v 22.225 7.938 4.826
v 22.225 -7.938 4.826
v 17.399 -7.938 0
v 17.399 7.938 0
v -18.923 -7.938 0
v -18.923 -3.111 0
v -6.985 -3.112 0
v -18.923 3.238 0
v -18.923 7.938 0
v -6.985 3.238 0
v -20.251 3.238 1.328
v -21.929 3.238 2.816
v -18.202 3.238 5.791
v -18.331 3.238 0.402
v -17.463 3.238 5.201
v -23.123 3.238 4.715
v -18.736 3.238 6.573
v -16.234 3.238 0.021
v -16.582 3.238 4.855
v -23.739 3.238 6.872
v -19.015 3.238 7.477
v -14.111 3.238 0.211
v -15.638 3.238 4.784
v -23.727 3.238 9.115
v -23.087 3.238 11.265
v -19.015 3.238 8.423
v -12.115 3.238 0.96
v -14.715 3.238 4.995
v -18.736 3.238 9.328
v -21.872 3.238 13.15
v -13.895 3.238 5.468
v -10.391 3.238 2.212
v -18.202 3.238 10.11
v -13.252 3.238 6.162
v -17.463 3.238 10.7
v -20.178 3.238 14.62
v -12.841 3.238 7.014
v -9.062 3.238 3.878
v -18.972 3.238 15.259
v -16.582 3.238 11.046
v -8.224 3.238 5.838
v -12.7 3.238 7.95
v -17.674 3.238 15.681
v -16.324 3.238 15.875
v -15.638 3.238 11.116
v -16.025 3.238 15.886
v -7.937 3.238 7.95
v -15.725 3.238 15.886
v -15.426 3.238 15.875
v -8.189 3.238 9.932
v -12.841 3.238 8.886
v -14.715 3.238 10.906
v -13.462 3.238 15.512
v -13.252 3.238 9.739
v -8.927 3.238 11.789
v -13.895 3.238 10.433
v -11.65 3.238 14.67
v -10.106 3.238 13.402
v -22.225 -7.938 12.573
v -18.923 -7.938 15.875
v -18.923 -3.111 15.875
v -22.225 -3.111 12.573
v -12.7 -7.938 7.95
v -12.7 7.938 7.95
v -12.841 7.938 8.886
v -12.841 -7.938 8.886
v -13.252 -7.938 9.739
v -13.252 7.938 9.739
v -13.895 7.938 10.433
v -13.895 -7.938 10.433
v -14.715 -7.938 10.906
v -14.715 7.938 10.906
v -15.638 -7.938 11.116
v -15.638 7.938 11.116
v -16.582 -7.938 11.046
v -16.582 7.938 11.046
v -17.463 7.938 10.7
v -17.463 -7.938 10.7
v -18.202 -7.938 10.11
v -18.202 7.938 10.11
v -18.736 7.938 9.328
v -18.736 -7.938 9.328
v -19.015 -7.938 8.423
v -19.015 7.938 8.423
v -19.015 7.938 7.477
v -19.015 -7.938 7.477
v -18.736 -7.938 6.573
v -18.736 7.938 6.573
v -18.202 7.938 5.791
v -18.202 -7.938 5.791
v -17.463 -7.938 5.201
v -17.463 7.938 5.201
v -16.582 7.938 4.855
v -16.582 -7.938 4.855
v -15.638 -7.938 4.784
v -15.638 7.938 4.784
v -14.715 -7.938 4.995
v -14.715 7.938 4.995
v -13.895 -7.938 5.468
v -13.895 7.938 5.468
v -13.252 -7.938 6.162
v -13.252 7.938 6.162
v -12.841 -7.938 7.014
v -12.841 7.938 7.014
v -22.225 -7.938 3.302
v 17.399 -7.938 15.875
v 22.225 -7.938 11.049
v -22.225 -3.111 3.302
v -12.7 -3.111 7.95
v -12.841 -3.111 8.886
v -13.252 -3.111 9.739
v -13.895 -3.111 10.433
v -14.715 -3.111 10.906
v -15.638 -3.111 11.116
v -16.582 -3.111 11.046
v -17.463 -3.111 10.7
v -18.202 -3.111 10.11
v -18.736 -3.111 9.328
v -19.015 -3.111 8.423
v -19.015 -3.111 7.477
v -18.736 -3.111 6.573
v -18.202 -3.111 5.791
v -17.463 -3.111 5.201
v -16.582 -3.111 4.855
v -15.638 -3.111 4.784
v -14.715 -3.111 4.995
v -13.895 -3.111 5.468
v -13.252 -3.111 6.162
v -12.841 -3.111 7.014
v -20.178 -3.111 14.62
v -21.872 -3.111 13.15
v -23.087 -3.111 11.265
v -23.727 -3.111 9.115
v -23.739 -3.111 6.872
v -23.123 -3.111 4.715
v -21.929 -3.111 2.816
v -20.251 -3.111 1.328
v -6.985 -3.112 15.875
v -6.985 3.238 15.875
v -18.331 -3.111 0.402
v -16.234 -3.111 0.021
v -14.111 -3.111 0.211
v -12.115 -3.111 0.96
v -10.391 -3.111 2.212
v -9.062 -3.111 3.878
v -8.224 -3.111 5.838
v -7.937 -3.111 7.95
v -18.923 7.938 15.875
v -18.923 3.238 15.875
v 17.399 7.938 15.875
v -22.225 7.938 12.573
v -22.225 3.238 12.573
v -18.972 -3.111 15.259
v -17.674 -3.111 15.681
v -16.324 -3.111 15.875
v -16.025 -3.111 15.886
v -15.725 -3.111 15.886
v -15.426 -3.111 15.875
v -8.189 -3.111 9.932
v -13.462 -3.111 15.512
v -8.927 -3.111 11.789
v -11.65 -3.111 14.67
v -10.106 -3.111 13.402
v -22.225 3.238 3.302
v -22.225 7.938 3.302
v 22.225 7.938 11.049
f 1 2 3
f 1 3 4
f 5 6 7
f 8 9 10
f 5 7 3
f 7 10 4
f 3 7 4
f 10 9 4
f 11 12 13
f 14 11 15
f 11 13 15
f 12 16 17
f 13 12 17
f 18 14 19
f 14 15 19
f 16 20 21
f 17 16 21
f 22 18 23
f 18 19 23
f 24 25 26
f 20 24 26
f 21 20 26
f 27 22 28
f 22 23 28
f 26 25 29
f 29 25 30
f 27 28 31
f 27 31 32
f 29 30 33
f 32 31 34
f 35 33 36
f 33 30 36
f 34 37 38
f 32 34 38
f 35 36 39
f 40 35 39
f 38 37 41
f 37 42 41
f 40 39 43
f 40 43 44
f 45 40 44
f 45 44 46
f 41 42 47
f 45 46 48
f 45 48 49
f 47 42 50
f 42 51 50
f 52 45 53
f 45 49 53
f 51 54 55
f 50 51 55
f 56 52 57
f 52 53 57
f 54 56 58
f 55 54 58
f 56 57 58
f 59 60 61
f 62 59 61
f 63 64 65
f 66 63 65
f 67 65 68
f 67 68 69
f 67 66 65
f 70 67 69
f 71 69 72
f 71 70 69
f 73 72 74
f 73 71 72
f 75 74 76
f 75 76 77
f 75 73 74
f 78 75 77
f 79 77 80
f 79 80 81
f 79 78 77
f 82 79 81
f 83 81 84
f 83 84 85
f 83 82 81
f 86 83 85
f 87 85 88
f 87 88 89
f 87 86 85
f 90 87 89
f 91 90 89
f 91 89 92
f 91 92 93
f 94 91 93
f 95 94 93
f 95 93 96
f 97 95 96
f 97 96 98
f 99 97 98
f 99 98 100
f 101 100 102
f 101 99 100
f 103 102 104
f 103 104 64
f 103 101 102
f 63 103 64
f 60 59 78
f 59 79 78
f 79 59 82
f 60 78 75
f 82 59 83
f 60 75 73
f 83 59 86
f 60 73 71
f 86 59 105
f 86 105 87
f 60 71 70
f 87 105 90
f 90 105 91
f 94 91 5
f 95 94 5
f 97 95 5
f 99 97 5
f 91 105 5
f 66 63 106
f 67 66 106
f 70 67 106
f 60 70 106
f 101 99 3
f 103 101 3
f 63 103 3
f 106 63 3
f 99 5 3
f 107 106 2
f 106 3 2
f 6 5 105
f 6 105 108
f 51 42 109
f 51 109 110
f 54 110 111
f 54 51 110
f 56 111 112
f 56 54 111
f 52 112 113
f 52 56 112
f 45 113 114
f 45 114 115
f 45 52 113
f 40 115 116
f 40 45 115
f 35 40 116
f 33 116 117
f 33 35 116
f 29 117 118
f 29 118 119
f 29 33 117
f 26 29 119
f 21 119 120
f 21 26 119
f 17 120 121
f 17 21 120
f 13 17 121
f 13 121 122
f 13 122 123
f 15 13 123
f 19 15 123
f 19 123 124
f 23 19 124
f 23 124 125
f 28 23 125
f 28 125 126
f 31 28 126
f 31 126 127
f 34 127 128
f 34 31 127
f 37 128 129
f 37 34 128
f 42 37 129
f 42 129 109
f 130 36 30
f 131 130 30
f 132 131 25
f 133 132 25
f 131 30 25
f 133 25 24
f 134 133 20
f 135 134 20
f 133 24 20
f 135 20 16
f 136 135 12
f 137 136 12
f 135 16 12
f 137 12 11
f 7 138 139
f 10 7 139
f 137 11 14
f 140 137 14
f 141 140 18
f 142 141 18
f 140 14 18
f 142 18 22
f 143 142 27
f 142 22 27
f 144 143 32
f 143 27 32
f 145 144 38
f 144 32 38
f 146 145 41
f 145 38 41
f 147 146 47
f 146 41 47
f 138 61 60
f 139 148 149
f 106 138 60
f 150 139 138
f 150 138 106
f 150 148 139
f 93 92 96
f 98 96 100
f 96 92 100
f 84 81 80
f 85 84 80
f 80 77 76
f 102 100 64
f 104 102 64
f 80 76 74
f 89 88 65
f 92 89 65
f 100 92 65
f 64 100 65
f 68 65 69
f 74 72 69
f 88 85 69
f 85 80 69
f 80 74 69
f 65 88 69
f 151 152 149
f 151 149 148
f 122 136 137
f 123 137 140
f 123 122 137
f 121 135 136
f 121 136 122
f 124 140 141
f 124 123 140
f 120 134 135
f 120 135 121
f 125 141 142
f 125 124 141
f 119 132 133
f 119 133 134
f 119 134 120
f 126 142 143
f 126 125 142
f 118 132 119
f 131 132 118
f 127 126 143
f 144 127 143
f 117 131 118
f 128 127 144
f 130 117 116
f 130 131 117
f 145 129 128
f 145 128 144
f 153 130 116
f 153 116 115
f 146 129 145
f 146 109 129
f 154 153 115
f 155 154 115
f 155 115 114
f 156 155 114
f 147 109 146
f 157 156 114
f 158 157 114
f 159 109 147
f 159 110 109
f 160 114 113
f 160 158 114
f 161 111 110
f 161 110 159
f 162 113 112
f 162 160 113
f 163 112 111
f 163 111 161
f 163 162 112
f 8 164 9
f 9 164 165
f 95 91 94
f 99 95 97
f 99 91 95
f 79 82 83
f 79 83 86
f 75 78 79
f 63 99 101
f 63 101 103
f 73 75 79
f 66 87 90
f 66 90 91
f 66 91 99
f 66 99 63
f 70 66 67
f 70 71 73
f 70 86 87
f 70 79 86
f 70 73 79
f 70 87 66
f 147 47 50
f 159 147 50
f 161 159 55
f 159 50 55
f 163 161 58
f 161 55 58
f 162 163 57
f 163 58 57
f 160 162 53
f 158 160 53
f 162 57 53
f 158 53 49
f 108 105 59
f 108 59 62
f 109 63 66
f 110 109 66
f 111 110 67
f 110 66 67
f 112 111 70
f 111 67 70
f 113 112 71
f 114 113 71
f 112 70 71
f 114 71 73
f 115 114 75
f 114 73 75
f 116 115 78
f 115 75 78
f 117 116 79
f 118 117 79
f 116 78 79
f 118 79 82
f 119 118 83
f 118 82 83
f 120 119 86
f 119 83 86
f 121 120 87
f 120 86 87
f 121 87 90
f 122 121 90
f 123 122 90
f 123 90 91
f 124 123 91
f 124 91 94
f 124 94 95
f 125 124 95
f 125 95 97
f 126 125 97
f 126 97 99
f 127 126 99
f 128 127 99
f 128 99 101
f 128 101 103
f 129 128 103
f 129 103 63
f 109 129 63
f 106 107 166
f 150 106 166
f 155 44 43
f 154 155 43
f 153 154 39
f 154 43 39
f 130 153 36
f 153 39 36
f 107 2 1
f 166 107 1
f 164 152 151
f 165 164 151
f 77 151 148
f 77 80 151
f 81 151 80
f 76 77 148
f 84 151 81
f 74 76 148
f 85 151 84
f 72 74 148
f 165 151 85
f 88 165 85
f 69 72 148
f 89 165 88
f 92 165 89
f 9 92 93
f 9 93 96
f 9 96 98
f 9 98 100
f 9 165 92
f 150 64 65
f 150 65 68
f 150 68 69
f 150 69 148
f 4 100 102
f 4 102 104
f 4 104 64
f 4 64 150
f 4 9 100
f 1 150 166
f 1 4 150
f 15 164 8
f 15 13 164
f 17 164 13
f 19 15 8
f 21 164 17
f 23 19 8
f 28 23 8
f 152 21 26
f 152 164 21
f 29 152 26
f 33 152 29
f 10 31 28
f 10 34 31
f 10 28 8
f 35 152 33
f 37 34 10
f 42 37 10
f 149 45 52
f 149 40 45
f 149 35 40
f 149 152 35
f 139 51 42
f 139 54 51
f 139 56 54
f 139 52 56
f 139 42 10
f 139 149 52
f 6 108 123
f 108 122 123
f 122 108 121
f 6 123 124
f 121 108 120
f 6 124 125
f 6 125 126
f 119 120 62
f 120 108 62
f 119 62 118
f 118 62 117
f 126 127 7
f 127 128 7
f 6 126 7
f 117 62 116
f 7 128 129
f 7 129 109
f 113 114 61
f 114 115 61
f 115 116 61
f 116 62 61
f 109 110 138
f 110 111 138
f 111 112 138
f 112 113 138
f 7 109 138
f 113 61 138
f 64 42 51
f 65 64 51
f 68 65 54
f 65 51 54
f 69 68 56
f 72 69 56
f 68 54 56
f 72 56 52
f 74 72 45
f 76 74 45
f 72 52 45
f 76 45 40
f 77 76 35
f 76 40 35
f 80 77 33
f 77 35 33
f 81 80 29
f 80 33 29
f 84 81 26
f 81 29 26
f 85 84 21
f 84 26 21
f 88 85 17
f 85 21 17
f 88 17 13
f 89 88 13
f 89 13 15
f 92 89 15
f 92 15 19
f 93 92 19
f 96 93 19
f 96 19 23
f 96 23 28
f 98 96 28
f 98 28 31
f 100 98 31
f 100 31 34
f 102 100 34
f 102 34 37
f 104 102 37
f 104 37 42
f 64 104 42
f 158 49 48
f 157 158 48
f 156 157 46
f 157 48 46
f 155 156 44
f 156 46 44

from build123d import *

# Parameters (mm, degrees)
F0_W      = 44.45
F0_H      = 15.875
F1_DEPTH  = 15.875
F2_W      = 15.24
F2_H      = 6.35
F3_DEPTH  = 15.876
F4_R      = 3.175
F5_DEPTH  = 15.876
F6_SIZE   = 3.302
F7_SIZE   = 4.826
F8_R      = 3.175
F9_DEPTH  = 15.875
F10_R     = 3.175
F11_DEPTH = 6.35


with BuildPart() as f1:
    # F0 (on Top) → F1 (new body)
    with BuildSketch(Plane.XY):
        Rectangle(F0_W, F0_H)
    extrude(amount=F1_DEPTH)

    # F2 (on face) → F3 (cut, through all)
    with BuildSketch(Plane.XY.offset(15.875)):
        with Locations((-14.605, 0.0635)):
            Rectangle(F2_W, F2_H)
    extrude(amount=-F3_DEPTH, mode=Mode.SUBTRACT)

    # F4 (on face) → F5 (cut, through all)
    with BuildSketch(Plane.XZ.offset(7.9375)):
        with Locations((-15.875, 7.9502)):
            Circle(F4_R)
    extrude(amount=-F5_DEPTH, mode=Mode.SUBTRACT)

    # F6
    f6_edges = [f1.edges().sort_by_distance(p)[0] for p in [
        (-22.225, 5.588, 15.875),
        (-22.225, -5.5245, 15.875),
        (-22.225, -5.5245, 0),
        (-22.225, 5.588, 0),
    ]]
    chamfer(f6_edges, length=F6_SIZE)

    # F7
    f7_edges = [f1.edges().sort_by_distance(p)[0] for p in [
        (22.225, 0, 15.875),
        (22.225, 0, 0),
    ]]
    chamfer(f7_edges, length=F7_SIZE)


with BuildPart() as f9:
    # F8 (on face) → F9 (new body)
    with BuildSketch(Plane.XZ.offset(7.9375)):
        with Locations((-15.875, 7.9502)):
            Circle(F8_R)
    extrude(amount=-F9_DEPTH)


with BuildPart() as f11:
    # F10 (on face) → F11 (new body)
    with BuildSketch(Plane.XZ.offset(-3.2385)):
        with BuildLine():
            ThreePointArc((-20.1776060293, 14.6203939707), (-23.8123797424, 7.9938929587), (-20.2507780003, 1.3277780003))
            Line((-20.2507780003, 1.3277780003), (-22.225, 3.302))
            Line((-22.225, 3.302), (-22.225, 12.573))
            Line((-22.225, 12.573), (-20.1776060293, 14.6203939707))
        make_face()
        with BuildLine():
            ThreePointArc((-20.2507780003, 1.3277780003), (-12.1152680699, 0.9596118943), (-7.9375, 7.9502))
            ThreePointArc((-7.9375, 7.9502), (-10.1058354376, 13.4018645624), (-15.426166835, 15.875))
            Line((-15.426166835, 15.875), (-16.323833165, 15.875))
            ThreePointArc((-16.323833165, 15.875), (-18.3321431941, 15.4978058173), (-20.1776060293, 14.6203939707))
            Line((-20.1776060293, 14.6203939707), (-22.225, 12.573))
            Line((-22.225, 12.573), (-22.225, 3.302))
            Line((-22.225, 3.302), (-20.2507780003, 1.3277780003))
        make_face()
        with Locations((-15.875, 7.9502)):
            Circle(F10_R, mode=Mode.SUBTRACT)
        with BuildLine():
            Line((-16.323833165, 15.875), (-15.426166835, 15.875))
            ThreePointArc((-15.426166835, 15.875), (-15.875, 15.8877), (-16.323833165, 15.875))
        make_face()
    extrude(amount=F11_DEPTH)


solid = Compound([f1.part, f9.part, f11.part])
